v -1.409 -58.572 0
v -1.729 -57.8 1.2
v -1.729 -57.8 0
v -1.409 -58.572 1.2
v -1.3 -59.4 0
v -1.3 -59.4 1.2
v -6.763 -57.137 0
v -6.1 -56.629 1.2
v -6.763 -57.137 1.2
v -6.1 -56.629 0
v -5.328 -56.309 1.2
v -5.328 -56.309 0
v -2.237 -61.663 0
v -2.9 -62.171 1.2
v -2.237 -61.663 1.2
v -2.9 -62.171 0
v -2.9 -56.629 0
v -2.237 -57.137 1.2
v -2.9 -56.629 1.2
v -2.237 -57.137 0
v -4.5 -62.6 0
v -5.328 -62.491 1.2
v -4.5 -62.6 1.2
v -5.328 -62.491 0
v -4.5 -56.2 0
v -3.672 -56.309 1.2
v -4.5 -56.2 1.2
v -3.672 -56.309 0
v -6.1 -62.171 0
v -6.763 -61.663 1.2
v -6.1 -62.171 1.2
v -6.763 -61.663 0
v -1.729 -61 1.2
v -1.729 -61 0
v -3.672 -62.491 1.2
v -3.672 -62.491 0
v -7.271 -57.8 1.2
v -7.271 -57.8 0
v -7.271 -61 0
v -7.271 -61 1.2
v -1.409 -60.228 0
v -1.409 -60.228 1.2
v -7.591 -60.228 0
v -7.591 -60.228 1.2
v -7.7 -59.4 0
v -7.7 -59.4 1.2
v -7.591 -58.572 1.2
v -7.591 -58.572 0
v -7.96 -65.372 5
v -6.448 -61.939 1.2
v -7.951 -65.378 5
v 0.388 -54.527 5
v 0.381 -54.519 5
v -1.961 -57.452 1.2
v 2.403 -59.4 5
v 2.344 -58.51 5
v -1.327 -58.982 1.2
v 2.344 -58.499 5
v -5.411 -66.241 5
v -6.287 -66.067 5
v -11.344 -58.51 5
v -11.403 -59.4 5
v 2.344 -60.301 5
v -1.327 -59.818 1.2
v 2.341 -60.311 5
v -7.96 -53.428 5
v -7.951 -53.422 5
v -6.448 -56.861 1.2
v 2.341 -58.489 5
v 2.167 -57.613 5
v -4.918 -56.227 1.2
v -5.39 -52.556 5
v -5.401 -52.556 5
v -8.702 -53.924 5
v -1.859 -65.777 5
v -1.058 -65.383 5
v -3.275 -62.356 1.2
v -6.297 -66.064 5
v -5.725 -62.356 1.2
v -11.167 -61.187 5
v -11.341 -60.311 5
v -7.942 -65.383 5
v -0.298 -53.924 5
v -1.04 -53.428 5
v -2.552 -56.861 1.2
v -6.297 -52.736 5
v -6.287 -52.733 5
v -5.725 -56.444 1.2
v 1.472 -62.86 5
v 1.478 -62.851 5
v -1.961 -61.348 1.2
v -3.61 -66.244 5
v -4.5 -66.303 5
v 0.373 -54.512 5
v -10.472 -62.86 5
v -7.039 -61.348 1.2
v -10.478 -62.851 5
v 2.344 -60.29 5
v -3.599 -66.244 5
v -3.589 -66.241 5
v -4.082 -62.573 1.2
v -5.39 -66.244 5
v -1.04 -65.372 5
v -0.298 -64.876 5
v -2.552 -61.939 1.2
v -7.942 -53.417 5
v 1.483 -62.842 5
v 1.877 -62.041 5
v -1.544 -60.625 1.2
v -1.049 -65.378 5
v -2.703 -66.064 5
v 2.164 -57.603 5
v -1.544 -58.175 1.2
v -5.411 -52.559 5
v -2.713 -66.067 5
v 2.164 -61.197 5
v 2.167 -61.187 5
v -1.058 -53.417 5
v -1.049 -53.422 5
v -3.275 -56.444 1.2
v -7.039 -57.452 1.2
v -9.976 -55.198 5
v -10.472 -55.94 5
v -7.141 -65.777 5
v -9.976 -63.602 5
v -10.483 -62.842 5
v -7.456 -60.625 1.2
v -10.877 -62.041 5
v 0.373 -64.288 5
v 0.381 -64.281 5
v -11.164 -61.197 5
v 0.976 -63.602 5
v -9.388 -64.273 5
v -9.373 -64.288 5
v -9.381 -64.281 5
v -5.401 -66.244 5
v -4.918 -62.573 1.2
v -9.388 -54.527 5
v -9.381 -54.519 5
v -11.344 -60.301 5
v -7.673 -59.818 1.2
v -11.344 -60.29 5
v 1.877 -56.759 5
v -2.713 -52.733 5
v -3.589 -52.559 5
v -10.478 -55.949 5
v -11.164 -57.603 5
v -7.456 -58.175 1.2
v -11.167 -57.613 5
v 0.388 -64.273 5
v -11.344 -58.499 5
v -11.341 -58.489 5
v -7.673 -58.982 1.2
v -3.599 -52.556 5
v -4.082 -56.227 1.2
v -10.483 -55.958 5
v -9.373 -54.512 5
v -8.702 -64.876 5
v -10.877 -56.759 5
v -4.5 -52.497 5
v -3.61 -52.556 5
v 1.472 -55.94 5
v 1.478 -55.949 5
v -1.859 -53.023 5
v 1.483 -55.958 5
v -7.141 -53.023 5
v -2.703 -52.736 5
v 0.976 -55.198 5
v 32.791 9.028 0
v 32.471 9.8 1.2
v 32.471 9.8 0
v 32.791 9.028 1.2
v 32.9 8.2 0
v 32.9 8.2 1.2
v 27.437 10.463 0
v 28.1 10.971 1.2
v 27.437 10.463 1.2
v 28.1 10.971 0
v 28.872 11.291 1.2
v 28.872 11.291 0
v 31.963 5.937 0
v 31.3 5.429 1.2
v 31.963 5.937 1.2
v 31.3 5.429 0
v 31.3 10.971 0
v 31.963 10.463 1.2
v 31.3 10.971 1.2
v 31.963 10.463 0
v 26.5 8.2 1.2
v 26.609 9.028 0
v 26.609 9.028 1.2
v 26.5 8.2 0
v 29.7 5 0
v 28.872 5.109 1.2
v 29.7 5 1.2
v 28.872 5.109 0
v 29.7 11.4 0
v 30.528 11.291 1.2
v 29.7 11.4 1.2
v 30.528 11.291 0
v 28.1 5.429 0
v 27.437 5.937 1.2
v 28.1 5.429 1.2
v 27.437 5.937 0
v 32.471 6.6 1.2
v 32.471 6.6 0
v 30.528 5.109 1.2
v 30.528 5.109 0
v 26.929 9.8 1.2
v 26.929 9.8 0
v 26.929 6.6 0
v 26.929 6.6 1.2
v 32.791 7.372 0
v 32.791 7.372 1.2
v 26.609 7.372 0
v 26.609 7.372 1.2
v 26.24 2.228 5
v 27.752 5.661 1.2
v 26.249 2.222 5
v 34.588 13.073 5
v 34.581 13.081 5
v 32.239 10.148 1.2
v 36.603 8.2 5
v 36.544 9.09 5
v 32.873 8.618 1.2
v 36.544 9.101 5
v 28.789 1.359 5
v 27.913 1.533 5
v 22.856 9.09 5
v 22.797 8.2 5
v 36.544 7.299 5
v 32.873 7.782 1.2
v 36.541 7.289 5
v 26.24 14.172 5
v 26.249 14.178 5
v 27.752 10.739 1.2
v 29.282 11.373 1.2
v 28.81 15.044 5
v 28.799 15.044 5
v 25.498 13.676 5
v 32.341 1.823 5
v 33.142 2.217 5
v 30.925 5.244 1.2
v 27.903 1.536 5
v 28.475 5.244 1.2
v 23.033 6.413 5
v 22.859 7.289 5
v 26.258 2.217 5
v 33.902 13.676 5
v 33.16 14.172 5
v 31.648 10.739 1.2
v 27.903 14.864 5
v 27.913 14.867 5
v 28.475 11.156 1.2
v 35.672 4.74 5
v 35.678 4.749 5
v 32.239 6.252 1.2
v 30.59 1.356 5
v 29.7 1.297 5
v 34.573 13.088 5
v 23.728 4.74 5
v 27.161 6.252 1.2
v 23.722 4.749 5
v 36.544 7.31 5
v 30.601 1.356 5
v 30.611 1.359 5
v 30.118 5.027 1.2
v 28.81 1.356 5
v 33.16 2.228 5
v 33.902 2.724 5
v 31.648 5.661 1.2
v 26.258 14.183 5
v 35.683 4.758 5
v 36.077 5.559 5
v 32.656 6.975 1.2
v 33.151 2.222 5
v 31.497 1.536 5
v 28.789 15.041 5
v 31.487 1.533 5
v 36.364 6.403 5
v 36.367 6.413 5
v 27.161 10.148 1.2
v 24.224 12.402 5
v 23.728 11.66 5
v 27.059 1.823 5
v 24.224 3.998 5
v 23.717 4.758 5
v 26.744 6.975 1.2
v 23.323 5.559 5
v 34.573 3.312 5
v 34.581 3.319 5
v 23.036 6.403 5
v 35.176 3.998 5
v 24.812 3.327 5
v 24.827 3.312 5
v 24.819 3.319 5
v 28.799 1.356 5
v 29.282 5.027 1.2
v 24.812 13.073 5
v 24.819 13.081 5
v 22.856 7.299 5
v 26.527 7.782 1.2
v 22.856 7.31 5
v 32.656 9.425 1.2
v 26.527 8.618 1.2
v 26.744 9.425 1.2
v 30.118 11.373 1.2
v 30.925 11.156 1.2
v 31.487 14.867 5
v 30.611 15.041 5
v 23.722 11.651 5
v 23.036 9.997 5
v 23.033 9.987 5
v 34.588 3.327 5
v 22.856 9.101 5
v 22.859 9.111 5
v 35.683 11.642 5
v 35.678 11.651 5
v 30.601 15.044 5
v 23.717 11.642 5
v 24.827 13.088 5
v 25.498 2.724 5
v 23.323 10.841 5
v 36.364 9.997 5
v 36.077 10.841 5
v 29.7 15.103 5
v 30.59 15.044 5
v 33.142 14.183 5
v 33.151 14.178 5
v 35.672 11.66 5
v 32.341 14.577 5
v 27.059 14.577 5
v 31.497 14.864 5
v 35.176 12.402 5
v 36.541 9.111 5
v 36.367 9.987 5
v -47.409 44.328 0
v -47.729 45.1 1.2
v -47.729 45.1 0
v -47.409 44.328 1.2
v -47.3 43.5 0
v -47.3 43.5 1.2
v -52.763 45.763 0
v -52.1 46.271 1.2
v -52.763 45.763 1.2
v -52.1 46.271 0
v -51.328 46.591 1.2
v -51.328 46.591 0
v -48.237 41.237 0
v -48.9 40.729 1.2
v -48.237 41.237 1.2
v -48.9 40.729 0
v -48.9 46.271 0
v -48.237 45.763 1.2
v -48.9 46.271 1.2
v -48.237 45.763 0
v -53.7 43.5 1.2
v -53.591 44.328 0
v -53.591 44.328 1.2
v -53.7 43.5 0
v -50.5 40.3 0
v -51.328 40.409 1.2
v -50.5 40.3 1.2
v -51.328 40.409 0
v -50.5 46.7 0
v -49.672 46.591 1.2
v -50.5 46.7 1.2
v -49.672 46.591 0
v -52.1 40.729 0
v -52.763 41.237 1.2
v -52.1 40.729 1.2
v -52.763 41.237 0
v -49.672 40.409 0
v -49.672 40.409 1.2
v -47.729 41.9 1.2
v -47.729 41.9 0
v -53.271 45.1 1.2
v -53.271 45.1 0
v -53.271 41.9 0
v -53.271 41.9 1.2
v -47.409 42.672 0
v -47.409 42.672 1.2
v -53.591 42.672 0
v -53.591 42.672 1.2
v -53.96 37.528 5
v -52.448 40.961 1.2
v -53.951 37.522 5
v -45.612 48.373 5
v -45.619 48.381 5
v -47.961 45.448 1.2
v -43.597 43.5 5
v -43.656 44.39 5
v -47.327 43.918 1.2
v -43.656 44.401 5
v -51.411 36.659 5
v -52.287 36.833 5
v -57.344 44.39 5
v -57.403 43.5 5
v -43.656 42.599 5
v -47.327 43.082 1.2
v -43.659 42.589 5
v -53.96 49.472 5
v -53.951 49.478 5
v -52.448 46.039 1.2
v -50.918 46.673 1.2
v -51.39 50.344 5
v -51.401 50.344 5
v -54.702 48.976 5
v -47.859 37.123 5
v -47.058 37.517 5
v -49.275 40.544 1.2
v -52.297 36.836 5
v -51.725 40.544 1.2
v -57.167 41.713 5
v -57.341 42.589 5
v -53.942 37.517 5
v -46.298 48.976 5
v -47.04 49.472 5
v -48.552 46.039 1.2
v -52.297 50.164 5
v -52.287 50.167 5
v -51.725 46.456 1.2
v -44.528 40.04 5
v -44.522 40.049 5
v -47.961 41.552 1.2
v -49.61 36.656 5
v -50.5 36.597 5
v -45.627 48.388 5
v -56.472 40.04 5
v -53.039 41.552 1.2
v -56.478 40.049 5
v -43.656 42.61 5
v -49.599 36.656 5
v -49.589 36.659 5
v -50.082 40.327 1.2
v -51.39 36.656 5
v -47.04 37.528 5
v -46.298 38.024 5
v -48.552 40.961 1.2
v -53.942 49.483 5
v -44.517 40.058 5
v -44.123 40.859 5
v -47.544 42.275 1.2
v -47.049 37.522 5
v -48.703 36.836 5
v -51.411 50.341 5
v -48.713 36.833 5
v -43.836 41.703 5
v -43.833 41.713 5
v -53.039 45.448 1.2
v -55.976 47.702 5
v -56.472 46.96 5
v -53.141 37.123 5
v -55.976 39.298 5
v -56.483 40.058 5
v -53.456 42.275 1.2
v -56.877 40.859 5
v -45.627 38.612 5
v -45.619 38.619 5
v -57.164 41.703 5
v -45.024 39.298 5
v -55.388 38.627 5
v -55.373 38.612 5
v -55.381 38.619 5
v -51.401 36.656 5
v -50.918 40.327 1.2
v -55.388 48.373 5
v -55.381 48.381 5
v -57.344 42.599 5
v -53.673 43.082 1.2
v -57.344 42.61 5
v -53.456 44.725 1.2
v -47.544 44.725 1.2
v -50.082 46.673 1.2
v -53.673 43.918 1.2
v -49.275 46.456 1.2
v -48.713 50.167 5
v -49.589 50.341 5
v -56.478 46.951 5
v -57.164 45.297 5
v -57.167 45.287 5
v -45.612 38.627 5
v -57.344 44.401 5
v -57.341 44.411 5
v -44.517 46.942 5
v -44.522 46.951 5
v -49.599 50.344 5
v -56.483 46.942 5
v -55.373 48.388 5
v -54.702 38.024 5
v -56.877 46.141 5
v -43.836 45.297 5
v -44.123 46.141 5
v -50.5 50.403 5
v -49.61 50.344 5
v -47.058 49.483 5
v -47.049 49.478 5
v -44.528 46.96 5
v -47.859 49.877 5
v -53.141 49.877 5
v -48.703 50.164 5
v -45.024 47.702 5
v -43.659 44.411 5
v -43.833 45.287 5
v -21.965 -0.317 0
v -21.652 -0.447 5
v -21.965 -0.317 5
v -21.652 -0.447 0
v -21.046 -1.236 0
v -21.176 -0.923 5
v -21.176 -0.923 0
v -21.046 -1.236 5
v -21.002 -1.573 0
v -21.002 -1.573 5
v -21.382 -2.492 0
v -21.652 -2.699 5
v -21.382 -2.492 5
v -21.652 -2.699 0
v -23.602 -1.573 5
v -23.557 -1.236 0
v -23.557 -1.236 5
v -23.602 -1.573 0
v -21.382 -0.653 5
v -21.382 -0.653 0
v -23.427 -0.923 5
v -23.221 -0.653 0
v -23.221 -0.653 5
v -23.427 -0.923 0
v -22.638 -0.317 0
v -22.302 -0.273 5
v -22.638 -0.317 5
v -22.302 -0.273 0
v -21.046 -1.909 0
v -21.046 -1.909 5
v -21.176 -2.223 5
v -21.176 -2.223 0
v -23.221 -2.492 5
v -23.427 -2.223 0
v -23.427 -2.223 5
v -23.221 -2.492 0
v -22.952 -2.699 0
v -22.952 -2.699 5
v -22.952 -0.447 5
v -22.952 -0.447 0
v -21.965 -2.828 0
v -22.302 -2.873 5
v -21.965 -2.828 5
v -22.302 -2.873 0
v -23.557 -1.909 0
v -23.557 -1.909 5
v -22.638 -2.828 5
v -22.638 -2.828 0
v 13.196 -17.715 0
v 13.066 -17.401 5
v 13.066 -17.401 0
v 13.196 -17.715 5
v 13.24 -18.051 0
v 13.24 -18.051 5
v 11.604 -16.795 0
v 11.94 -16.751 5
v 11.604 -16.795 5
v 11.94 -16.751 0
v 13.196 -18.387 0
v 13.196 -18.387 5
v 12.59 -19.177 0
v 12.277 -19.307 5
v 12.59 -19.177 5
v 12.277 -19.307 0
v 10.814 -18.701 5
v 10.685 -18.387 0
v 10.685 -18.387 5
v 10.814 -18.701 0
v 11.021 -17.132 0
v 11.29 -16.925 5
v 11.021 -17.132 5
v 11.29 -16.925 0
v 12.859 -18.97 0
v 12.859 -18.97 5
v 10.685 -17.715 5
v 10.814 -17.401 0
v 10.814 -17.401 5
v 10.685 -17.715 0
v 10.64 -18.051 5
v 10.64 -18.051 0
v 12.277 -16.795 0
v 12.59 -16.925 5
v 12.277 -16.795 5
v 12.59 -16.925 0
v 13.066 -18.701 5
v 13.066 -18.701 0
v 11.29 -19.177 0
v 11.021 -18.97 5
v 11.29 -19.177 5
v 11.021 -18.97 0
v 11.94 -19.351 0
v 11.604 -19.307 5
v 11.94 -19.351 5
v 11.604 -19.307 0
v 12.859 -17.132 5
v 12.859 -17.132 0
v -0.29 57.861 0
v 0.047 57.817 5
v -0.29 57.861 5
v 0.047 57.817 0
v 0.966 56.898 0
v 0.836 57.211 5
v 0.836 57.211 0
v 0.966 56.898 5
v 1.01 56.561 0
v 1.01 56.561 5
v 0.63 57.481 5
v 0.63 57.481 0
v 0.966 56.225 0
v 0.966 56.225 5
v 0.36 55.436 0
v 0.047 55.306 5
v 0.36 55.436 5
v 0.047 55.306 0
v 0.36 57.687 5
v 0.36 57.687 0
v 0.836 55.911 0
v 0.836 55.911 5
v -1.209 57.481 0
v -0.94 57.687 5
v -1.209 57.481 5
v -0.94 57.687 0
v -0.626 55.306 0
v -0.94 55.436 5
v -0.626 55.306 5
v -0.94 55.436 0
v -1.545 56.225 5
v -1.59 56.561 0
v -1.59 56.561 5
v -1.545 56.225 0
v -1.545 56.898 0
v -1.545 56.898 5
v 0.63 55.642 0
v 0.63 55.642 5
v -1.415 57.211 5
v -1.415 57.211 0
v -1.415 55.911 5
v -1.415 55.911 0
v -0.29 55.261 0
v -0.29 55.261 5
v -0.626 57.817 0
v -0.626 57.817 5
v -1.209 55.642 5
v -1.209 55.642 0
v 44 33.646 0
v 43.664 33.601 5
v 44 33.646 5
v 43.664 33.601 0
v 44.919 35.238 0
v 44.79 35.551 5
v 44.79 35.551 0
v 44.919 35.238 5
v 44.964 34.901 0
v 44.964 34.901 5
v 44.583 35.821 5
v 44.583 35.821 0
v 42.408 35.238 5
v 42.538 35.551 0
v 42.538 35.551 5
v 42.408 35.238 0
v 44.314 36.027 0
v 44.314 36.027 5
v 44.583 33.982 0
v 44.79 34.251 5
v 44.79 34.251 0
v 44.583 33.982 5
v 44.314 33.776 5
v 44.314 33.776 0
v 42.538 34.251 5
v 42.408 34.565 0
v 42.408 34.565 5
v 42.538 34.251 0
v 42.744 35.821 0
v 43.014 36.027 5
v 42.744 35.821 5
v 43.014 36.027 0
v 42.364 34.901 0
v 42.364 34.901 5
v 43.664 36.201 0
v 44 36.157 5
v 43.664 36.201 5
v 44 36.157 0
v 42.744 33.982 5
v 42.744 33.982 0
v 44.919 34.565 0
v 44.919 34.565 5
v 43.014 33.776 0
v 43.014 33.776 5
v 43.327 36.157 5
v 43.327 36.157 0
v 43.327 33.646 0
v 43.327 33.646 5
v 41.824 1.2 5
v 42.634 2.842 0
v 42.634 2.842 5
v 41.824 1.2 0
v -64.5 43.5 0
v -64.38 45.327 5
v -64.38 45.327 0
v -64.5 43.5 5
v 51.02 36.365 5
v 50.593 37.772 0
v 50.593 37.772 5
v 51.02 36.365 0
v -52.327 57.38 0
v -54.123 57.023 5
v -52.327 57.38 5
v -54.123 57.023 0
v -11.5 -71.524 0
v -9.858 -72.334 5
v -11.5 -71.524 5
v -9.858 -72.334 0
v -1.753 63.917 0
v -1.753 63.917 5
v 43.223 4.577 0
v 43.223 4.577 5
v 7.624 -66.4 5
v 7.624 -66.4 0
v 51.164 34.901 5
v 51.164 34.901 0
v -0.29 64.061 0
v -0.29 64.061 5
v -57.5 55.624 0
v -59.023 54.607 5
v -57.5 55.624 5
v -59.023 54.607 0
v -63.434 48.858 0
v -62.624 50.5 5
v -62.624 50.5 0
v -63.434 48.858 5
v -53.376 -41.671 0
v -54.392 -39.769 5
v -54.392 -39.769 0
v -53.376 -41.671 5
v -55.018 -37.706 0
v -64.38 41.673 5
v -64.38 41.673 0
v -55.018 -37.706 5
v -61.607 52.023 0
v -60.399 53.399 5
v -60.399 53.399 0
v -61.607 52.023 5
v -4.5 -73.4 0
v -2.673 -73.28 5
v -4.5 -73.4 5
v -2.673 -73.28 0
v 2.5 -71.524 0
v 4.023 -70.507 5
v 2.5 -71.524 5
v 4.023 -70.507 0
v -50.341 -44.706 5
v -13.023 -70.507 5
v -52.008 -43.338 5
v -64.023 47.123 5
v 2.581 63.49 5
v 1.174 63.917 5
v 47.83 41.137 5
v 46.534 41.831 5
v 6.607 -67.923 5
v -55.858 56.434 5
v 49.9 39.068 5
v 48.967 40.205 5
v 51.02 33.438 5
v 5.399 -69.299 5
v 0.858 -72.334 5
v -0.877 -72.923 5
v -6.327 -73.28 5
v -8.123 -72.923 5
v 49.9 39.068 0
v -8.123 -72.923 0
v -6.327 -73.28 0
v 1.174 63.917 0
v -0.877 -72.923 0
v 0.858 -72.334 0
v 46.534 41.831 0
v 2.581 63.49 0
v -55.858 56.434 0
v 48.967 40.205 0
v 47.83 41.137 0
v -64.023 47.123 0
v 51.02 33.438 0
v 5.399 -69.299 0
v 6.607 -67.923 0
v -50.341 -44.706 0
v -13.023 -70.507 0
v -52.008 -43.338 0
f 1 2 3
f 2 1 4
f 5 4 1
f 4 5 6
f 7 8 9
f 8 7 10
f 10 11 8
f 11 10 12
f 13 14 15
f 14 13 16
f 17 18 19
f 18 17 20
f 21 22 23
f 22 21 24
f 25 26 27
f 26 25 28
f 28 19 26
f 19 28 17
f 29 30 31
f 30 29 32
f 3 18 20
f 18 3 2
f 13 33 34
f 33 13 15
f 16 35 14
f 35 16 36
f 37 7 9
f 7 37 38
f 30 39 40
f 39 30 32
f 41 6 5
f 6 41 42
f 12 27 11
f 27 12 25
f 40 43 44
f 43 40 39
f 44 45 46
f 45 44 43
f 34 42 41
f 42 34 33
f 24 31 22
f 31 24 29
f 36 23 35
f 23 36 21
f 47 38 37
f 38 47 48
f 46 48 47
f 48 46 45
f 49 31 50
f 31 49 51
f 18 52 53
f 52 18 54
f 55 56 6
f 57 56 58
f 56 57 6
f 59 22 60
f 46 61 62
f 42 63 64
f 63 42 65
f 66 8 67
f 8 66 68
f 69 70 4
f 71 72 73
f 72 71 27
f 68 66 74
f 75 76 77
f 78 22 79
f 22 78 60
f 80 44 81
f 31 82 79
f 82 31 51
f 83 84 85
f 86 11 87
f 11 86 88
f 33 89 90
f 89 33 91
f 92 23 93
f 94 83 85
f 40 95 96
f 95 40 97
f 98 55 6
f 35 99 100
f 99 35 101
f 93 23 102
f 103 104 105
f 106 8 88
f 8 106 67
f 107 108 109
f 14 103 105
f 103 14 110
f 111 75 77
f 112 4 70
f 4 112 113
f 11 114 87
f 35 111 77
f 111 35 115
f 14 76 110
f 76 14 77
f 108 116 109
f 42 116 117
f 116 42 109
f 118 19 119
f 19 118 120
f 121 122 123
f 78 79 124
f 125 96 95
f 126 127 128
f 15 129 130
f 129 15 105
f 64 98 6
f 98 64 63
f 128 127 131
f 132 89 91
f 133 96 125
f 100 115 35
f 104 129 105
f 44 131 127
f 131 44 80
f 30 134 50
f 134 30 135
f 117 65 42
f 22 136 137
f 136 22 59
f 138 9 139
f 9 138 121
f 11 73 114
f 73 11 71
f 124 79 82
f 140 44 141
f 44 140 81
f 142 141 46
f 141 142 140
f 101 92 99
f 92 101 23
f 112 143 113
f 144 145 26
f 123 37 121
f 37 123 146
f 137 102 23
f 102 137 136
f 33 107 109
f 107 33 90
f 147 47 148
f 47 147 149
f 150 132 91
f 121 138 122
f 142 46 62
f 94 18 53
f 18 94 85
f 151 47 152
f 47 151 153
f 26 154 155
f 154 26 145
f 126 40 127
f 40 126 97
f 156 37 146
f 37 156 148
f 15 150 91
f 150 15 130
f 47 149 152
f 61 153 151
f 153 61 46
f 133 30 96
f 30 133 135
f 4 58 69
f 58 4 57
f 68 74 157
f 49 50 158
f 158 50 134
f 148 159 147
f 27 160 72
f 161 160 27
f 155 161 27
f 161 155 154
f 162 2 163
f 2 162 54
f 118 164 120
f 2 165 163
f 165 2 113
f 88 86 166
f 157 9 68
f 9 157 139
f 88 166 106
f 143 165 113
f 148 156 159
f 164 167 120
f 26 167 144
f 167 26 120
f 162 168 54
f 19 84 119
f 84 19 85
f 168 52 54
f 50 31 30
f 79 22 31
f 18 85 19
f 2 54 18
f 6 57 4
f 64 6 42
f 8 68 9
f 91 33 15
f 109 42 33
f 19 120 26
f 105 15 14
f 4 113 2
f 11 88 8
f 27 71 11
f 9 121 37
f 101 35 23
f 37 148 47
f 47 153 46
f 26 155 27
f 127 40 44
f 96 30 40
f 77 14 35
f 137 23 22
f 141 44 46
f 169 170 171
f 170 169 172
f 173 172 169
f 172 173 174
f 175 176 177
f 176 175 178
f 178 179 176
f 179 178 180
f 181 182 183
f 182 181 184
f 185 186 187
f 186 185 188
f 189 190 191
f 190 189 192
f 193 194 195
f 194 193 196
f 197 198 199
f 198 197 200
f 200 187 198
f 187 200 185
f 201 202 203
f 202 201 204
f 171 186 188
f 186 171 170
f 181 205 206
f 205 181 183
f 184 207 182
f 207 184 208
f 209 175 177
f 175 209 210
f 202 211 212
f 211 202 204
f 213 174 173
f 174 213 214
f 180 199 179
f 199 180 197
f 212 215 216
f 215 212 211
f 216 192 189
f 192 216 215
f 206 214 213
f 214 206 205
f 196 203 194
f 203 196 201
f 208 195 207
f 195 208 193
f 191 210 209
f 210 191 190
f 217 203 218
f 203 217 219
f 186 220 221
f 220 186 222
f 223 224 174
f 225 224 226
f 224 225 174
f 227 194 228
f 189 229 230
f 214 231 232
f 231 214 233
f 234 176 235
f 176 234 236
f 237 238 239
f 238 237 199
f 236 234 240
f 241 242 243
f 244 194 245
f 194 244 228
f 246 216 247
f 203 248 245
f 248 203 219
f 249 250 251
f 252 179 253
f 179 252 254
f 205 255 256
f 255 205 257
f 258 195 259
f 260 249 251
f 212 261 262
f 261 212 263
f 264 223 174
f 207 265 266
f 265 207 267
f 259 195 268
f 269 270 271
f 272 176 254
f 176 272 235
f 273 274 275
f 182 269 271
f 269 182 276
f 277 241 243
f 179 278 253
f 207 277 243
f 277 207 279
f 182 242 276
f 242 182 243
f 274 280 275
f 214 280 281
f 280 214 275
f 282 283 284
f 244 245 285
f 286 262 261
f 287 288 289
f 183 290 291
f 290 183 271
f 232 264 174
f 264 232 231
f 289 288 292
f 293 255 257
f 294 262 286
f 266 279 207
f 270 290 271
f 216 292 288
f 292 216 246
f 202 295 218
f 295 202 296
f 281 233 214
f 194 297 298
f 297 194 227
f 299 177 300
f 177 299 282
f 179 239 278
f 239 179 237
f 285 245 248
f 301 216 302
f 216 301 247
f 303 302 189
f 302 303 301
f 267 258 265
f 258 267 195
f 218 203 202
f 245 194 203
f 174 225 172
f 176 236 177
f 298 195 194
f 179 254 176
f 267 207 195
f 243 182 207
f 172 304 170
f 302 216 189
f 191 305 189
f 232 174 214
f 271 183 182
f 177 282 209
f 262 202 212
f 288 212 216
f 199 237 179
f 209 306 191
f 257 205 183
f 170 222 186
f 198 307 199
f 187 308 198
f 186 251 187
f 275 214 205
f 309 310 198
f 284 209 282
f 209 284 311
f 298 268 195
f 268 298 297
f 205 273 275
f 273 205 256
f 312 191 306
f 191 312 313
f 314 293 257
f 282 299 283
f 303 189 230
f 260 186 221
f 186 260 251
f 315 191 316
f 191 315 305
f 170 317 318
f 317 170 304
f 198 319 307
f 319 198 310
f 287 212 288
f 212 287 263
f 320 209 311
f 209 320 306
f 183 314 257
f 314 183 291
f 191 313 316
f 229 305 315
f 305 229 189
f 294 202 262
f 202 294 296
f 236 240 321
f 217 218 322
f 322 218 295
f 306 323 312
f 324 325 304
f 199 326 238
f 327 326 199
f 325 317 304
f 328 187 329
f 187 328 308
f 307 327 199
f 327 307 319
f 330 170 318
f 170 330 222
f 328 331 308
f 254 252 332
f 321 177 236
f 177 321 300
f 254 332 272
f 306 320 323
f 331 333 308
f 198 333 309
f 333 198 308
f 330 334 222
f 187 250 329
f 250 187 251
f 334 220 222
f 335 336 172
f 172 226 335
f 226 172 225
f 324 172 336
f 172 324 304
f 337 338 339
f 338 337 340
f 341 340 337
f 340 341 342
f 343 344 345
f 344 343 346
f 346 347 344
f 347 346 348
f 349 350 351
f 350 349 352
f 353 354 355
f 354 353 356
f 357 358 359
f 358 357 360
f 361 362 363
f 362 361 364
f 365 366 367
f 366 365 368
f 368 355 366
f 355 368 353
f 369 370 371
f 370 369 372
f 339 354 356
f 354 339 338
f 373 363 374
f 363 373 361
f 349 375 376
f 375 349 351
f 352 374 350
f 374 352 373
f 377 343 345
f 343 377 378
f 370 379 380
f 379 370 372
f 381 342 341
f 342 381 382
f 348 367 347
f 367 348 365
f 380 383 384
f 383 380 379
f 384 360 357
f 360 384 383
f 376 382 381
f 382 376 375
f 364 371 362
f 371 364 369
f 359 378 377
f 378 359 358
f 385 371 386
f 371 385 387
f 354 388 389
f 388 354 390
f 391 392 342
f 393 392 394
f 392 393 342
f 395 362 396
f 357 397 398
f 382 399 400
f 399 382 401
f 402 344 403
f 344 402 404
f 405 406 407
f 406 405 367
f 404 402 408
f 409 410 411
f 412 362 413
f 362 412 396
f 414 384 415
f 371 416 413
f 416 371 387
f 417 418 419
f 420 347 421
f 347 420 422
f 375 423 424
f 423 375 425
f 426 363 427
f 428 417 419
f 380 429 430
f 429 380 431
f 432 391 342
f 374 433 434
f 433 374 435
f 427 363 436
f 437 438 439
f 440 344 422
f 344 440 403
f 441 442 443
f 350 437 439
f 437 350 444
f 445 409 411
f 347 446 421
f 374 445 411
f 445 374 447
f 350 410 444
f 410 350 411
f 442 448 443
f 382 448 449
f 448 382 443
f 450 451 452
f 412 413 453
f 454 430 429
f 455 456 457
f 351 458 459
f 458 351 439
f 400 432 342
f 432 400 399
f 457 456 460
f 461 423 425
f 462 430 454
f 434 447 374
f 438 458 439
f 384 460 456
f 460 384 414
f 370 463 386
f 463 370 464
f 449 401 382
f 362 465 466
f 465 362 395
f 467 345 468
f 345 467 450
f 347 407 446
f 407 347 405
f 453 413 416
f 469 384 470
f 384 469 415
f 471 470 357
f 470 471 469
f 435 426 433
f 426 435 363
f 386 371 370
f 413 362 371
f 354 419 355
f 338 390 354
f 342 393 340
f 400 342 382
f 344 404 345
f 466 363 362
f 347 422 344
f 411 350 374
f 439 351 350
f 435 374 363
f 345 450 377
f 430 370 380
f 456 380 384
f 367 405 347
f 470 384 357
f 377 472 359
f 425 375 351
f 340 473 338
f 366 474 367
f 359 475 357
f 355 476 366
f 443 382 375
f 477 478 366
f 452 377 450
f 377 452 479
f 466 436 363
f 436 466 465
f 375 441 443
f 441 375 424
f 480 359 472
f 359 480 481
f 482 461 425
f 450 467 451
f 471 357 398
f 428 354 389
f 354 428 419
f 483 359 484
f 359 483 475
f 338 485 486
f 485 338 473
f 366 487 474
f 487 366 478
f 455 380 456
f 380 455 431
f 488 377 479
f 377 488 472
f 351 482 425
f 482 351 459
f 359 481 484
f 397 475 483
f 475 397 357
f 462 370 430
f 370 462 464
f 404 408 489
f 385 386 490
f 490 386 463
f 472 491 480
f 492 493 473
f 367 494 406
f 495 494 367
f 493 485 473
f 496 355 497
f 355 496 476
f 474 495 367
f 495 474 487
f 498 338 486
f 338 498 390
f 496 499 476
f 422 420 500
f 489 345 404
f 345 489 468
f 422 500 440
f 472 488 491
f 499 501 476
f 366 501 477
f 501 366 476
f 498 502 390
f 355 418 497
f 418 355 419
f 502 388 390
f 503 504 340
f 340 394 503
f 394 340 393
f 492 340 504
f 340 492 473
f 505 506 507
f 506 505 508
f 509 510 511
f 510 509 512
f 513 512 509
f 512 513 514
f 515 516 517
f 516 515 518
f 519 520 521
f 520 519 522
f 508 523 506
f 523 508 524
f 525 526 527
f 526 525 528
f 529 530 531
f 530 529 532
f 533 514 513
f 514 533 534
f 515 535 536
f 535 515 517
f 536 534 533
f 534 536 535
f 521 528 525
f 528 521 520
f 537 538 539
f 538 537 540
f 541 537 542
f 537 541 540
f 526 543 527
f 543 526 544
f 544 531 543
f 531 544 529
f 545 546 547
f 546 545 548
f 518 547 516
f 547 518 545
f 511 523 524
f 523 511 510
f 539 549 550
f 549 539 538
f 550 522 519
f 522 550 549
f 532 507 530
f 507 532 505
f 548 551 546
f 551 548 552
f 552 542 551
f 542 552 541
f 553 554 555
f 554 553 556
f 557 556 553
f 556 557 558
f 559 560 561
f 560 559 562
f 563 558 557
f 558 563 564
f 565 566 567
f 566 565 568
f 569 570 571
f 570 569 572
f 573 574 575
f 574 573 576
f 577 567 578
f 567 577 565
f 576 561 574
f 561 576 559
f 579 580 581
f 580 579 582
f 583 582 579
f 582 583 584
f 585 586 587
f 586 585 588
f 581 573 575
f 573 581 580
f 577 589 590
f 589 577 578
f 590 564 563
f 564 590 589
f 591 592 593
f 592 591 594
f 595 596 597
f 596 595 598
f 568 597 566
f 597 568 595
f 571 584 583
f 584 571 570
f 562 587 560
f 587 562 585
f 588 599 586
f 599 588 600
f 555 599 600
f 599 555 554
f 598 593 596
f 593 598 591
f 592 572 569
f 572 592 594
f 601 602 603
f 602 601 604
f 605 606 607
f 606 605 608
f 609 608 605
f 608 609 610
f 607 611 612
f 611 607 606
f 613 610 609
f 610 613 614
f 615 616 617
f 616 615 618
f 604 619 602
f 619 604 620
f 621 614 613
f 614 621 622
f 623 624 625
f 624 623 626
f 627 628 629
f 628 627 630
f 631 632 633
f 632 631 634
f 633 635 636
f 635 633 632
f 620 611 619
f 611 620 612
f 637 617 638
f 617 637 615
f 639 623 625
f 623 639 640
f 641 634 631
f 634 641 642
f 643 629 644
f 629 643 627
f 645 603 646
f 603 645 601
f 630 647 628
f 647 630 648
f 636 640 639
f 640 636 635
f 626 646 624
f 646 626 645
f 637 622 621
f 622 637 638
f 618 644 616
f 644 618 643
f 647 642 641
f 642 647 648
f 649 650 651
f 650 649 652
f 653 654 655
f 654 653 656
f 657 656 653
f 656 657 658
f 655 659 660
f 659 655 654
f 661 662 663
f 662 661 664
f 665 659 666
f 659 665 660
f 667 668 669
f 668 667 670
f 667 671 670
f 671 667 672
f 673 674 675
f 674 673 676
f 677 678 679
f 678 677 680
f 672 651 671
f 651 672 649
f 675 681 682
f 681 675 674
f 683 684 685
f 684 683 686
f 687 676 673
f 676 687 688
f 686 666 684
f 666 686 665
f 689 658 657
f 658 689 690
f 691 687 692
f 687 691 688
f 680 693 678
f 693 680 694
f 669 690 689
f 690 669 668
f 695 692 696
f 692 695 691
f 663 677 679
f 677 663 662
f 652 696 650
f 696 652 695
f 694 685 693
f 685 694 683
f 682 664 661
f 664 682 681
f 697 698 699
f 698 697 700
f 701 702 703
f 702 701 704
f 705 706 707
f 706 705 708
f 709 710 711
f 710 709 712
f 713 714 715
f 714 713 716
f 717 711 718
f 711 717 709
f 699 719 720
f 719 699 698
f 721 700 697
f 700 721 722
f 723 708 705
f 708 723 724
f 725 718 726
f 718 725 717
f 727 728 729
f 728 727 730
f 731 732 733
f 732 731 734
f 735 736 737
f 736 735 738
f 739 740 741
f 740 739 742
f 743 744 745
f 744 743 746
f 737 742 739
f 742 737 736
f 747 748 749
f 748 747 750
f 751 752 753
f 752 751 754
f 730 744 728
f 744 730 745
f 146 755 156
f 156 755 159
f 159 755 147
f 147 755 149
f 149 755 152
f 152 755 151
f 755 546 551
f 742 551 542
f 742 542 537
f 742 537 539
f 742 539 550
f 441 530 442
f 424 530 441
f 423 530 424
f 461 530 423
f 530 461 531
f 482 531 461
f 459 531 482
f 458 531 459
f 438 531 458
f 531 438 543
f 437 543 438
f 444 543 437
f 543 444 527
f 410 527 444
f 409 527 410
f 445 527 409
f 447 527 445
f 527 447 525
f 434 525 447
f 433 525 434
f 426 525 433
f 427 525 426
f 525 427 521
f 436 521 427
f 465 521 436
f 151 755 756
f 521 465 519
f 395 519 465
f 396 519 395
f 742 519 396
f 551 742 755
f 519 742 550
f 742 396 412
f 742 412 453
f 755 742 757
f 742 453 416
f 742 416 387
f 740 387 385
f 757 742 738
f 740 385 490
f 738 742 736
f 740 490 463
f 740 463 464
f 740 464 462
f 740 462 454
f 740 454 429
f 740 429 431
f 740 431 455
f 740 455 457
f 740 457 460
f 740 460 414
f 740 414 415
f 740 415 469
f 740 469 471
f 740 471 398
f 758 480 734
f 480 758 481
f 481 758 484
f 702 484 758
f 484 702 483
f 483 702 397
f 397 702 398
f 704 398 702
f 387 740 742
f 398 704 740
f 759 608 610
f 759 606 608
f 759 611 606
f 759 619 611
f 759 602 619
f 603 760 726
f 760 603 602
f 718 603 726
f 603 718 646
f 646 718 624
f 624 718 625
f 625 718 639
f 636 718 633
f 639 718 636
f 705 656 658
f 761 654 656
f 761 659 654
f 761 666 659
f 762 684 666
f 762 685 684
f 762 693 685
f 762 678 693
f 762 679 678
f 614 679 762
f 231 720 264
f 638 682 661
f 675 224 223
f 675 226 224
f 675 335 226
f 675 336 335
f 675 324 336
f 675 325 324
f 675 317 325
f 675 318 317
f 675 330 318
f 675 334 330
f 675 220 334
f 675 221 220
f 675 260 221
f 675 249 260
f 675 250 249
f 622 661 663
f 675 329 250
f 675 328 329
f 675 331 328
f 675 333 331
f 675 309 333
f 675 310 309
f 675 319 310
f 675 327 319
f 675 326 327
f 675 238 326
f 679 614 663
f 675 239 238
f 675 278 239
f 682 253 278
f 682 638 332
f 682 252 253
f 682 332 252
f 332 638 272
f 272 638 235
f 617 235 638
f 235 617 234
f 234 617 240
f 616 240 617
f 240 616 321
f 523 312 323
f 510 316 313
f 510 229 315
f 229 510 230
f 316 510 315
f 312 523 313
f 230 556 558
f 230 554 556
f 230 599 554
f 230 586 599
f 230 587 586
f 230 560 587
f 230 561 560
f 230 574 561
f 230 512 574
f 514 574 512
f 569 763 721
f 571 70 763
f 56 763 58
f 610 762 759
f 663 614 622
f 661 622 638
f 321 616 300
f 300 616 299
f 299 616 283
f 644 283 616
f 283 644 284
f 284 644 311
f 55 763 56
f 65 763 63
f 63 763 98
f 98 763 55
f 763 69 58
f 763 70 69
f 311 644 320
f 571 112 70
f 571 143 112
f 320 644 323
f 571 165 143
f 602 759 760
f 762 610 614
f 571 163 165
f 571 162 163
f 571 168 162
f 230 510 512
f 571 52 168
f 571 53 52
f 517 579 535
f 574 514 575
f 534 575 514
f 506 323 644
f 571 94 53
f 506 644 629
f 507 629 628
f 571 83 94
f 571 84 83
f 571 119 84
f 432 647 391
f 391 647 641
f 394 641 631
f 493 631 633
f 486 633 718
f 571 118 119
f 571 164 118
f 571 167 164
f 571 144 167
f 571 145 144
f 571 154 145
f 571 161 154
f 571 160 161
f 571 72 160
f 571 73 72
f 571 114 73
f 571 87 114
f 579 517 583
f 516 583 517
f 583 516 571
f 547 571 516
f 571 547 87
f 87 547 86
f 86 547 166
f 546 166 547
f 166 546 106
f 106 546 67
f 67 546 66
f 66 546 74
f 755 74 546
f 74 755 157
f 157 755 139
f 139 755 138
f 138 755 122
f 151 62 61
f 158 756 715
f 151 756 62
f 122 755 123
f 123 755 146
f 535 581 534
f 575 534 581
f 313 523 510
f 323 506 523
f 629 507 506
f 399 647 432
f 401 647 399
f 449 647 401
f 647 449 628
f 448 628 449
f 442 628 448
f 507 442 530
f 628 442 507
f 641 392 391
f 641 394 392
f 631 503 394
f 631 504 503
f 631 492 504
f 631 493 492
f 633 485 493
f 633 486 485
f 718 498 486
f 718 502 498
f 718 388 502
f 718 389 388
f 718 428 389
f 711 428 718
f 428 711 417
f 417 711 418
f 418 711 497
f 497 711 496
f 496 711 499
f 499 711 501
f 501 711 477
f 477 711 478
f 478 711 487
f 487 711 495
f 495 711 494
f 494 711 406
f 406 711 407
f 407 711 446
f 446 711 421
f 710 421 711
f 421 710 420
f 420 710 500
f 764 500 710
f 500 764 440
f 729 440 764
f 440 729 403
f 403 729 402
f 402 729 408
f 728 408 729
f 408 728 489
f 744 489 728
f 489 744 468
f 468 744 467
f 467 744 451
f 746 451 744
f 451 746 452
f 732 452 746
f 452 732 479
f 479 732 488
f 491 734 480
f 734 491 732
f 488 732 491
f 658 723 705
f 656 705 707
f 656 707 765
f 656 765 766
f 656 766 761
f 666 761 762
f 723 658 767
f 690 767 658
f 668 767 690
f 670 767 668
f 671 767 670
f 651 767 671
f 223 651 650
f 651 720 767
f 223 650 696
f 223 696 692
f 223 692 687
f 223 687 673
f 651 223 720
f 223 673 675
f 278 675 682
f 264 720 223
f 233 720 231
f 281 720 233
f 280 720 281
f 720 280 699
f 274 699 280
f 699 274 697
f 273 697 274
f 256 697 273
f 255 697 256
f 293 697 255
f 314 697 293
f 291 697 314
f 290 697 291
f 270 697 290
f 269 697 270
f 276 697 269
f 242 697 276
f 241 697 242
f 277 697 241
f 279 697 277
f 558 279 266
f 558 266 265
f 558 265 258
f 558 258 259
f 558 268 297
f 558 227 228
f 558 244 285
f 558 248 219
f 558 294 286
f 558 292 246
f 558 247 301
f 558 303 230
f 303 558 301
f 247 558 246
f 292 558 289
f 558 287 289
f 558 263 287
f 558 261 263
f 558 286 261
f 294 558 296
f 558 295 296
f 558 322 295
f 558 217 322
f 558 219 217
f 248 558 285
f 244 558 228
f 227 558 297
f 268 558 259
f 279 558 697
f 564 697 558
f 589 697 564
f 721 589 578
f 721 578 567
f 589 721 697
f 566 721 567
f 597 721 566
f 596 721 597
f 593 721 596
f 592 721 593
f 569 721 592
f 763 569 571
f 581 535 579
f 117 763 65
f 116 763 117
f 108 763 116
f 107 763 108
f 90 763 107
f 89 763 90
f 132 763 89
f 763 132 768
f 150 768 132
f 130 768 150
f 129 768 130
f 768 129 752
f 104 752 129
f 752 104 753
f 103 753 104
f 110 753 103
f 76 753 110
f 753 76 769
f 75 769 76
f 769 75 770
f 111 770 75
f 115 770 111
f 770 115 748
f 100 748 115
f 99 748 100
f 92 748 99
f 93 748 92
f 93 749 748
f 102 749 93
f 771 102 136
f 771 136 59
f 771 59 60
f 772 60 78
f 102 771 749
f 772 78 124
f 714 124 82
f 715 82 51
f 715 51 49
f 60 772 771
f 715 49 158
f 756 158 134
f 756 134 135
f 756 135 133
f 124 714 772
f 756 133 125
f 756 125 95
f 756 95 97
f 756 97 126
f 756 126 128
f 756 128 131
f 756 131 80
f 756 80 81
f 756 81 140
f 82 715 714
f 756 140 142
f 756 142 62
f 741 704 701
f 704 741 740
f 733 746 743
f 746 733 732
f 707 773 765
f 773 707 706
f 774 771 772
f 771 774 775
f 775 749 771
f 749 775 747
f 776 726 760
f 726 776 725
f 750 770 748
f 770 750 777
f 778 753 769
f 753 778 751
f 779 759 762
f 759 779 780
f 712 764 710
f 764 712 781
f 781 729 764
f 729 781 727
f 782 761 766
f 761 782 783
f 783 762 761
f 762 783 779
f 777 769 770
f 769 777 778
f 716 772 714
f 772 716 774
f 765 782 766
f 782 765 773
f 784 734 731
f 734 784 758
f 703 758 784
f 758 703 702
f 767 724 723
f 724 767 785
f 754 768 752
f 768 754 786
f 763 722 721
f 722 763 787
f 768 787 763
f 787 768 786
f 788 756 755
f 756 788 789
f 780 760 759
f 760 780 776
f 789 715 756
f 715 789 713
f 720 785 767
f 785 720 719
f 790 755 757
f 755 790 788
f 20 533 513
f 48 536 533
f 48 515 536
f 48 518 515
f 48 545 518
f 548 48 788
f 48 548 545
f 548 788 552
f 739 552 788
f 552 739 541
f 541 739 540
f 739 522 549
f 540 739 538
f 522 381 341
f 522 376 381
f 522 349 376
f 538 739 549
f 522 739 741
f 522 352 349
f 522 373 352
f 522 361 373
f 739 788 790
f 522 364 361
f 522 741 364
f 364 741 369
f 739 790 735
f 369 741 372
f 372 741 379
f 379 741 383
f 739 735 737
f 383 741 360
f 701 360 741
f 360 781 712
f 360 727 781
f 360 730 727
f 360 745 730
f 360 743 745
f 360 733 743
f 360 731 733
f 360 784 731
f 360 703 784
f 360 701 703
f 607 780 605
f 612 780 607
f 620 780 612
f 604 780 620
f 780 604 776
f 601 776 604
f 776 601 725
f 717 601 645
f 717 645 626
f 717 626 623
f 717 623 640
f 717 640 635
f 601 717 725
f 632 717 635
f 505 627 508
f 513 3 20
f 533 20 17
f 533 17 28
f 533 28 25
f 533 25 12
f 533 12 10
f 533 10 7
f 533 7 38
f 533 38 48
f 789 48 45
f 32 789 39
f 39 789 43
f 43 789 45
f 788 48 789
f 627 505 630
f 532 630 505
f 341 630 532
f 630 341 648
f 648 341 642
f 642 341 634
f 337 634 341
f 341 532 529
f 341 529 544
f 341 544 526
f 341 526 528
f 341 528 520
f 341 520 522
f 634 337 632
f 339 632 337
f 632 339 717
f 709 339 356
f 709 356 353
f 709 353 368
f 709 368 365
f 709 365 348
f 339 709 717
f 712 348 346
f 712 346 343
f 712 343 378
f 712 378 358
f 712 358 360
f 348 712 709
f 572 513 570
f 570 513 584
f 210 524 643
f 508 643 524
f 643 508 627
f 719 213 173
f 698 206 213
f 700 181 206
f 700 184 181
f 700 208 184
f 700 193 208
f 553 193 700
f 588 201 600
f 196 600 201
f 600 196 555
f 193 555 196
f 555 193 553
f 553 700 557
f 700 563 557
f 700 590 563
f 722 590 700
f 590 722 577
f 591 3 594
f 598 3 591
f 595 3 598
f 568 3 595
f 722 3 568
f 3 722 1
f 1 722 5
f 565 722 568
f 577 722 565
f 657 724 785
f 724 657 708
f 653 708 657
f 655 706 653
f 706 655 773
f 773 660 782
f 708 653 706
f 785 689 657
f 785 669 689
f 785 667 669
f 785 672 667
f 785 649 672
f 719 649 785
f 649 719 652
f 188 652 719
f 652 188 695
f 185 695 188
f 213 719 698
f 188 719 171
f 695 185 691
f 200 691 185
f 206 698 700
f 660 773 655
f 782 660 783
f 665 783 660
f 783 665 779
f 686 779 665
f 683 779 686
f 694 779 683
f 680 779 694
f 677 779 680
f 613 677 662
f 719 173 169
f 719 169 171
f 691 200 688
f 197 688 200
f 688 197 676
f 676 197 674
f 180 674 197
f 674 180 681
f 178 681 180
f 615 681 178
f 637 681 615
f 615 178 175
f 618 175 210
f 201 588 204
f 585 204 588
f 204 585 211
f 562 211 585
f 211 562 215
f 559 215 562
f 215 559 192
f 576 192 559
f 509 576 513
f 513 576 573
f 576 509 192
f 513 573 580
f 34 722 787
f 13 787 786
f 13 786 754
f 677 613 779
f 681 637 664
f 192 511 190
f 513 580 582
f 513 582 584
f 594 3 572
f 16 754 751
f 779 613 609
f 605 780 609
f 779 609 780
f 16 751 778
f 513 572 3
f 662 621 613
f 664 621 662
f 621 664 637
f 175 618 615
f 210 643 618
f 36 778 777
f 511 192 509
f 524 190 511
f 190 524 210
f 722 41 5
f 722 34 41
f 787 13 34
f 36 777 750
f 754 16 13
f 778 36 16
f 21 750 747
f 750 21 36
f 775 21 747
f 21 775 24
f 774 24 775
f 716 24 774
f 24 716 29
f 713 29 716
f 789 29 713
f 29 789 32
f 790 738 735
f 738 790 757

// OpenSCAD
// Print-ready export: the electronics deck (Mega base-plate mount),
// dropped from its assembled height to z=0, mating face down.
//   openscad -o electronics_deck.stl print_electronics_deck.scad
use <dial_unit_housing.scad>
print_electronics_deck();
